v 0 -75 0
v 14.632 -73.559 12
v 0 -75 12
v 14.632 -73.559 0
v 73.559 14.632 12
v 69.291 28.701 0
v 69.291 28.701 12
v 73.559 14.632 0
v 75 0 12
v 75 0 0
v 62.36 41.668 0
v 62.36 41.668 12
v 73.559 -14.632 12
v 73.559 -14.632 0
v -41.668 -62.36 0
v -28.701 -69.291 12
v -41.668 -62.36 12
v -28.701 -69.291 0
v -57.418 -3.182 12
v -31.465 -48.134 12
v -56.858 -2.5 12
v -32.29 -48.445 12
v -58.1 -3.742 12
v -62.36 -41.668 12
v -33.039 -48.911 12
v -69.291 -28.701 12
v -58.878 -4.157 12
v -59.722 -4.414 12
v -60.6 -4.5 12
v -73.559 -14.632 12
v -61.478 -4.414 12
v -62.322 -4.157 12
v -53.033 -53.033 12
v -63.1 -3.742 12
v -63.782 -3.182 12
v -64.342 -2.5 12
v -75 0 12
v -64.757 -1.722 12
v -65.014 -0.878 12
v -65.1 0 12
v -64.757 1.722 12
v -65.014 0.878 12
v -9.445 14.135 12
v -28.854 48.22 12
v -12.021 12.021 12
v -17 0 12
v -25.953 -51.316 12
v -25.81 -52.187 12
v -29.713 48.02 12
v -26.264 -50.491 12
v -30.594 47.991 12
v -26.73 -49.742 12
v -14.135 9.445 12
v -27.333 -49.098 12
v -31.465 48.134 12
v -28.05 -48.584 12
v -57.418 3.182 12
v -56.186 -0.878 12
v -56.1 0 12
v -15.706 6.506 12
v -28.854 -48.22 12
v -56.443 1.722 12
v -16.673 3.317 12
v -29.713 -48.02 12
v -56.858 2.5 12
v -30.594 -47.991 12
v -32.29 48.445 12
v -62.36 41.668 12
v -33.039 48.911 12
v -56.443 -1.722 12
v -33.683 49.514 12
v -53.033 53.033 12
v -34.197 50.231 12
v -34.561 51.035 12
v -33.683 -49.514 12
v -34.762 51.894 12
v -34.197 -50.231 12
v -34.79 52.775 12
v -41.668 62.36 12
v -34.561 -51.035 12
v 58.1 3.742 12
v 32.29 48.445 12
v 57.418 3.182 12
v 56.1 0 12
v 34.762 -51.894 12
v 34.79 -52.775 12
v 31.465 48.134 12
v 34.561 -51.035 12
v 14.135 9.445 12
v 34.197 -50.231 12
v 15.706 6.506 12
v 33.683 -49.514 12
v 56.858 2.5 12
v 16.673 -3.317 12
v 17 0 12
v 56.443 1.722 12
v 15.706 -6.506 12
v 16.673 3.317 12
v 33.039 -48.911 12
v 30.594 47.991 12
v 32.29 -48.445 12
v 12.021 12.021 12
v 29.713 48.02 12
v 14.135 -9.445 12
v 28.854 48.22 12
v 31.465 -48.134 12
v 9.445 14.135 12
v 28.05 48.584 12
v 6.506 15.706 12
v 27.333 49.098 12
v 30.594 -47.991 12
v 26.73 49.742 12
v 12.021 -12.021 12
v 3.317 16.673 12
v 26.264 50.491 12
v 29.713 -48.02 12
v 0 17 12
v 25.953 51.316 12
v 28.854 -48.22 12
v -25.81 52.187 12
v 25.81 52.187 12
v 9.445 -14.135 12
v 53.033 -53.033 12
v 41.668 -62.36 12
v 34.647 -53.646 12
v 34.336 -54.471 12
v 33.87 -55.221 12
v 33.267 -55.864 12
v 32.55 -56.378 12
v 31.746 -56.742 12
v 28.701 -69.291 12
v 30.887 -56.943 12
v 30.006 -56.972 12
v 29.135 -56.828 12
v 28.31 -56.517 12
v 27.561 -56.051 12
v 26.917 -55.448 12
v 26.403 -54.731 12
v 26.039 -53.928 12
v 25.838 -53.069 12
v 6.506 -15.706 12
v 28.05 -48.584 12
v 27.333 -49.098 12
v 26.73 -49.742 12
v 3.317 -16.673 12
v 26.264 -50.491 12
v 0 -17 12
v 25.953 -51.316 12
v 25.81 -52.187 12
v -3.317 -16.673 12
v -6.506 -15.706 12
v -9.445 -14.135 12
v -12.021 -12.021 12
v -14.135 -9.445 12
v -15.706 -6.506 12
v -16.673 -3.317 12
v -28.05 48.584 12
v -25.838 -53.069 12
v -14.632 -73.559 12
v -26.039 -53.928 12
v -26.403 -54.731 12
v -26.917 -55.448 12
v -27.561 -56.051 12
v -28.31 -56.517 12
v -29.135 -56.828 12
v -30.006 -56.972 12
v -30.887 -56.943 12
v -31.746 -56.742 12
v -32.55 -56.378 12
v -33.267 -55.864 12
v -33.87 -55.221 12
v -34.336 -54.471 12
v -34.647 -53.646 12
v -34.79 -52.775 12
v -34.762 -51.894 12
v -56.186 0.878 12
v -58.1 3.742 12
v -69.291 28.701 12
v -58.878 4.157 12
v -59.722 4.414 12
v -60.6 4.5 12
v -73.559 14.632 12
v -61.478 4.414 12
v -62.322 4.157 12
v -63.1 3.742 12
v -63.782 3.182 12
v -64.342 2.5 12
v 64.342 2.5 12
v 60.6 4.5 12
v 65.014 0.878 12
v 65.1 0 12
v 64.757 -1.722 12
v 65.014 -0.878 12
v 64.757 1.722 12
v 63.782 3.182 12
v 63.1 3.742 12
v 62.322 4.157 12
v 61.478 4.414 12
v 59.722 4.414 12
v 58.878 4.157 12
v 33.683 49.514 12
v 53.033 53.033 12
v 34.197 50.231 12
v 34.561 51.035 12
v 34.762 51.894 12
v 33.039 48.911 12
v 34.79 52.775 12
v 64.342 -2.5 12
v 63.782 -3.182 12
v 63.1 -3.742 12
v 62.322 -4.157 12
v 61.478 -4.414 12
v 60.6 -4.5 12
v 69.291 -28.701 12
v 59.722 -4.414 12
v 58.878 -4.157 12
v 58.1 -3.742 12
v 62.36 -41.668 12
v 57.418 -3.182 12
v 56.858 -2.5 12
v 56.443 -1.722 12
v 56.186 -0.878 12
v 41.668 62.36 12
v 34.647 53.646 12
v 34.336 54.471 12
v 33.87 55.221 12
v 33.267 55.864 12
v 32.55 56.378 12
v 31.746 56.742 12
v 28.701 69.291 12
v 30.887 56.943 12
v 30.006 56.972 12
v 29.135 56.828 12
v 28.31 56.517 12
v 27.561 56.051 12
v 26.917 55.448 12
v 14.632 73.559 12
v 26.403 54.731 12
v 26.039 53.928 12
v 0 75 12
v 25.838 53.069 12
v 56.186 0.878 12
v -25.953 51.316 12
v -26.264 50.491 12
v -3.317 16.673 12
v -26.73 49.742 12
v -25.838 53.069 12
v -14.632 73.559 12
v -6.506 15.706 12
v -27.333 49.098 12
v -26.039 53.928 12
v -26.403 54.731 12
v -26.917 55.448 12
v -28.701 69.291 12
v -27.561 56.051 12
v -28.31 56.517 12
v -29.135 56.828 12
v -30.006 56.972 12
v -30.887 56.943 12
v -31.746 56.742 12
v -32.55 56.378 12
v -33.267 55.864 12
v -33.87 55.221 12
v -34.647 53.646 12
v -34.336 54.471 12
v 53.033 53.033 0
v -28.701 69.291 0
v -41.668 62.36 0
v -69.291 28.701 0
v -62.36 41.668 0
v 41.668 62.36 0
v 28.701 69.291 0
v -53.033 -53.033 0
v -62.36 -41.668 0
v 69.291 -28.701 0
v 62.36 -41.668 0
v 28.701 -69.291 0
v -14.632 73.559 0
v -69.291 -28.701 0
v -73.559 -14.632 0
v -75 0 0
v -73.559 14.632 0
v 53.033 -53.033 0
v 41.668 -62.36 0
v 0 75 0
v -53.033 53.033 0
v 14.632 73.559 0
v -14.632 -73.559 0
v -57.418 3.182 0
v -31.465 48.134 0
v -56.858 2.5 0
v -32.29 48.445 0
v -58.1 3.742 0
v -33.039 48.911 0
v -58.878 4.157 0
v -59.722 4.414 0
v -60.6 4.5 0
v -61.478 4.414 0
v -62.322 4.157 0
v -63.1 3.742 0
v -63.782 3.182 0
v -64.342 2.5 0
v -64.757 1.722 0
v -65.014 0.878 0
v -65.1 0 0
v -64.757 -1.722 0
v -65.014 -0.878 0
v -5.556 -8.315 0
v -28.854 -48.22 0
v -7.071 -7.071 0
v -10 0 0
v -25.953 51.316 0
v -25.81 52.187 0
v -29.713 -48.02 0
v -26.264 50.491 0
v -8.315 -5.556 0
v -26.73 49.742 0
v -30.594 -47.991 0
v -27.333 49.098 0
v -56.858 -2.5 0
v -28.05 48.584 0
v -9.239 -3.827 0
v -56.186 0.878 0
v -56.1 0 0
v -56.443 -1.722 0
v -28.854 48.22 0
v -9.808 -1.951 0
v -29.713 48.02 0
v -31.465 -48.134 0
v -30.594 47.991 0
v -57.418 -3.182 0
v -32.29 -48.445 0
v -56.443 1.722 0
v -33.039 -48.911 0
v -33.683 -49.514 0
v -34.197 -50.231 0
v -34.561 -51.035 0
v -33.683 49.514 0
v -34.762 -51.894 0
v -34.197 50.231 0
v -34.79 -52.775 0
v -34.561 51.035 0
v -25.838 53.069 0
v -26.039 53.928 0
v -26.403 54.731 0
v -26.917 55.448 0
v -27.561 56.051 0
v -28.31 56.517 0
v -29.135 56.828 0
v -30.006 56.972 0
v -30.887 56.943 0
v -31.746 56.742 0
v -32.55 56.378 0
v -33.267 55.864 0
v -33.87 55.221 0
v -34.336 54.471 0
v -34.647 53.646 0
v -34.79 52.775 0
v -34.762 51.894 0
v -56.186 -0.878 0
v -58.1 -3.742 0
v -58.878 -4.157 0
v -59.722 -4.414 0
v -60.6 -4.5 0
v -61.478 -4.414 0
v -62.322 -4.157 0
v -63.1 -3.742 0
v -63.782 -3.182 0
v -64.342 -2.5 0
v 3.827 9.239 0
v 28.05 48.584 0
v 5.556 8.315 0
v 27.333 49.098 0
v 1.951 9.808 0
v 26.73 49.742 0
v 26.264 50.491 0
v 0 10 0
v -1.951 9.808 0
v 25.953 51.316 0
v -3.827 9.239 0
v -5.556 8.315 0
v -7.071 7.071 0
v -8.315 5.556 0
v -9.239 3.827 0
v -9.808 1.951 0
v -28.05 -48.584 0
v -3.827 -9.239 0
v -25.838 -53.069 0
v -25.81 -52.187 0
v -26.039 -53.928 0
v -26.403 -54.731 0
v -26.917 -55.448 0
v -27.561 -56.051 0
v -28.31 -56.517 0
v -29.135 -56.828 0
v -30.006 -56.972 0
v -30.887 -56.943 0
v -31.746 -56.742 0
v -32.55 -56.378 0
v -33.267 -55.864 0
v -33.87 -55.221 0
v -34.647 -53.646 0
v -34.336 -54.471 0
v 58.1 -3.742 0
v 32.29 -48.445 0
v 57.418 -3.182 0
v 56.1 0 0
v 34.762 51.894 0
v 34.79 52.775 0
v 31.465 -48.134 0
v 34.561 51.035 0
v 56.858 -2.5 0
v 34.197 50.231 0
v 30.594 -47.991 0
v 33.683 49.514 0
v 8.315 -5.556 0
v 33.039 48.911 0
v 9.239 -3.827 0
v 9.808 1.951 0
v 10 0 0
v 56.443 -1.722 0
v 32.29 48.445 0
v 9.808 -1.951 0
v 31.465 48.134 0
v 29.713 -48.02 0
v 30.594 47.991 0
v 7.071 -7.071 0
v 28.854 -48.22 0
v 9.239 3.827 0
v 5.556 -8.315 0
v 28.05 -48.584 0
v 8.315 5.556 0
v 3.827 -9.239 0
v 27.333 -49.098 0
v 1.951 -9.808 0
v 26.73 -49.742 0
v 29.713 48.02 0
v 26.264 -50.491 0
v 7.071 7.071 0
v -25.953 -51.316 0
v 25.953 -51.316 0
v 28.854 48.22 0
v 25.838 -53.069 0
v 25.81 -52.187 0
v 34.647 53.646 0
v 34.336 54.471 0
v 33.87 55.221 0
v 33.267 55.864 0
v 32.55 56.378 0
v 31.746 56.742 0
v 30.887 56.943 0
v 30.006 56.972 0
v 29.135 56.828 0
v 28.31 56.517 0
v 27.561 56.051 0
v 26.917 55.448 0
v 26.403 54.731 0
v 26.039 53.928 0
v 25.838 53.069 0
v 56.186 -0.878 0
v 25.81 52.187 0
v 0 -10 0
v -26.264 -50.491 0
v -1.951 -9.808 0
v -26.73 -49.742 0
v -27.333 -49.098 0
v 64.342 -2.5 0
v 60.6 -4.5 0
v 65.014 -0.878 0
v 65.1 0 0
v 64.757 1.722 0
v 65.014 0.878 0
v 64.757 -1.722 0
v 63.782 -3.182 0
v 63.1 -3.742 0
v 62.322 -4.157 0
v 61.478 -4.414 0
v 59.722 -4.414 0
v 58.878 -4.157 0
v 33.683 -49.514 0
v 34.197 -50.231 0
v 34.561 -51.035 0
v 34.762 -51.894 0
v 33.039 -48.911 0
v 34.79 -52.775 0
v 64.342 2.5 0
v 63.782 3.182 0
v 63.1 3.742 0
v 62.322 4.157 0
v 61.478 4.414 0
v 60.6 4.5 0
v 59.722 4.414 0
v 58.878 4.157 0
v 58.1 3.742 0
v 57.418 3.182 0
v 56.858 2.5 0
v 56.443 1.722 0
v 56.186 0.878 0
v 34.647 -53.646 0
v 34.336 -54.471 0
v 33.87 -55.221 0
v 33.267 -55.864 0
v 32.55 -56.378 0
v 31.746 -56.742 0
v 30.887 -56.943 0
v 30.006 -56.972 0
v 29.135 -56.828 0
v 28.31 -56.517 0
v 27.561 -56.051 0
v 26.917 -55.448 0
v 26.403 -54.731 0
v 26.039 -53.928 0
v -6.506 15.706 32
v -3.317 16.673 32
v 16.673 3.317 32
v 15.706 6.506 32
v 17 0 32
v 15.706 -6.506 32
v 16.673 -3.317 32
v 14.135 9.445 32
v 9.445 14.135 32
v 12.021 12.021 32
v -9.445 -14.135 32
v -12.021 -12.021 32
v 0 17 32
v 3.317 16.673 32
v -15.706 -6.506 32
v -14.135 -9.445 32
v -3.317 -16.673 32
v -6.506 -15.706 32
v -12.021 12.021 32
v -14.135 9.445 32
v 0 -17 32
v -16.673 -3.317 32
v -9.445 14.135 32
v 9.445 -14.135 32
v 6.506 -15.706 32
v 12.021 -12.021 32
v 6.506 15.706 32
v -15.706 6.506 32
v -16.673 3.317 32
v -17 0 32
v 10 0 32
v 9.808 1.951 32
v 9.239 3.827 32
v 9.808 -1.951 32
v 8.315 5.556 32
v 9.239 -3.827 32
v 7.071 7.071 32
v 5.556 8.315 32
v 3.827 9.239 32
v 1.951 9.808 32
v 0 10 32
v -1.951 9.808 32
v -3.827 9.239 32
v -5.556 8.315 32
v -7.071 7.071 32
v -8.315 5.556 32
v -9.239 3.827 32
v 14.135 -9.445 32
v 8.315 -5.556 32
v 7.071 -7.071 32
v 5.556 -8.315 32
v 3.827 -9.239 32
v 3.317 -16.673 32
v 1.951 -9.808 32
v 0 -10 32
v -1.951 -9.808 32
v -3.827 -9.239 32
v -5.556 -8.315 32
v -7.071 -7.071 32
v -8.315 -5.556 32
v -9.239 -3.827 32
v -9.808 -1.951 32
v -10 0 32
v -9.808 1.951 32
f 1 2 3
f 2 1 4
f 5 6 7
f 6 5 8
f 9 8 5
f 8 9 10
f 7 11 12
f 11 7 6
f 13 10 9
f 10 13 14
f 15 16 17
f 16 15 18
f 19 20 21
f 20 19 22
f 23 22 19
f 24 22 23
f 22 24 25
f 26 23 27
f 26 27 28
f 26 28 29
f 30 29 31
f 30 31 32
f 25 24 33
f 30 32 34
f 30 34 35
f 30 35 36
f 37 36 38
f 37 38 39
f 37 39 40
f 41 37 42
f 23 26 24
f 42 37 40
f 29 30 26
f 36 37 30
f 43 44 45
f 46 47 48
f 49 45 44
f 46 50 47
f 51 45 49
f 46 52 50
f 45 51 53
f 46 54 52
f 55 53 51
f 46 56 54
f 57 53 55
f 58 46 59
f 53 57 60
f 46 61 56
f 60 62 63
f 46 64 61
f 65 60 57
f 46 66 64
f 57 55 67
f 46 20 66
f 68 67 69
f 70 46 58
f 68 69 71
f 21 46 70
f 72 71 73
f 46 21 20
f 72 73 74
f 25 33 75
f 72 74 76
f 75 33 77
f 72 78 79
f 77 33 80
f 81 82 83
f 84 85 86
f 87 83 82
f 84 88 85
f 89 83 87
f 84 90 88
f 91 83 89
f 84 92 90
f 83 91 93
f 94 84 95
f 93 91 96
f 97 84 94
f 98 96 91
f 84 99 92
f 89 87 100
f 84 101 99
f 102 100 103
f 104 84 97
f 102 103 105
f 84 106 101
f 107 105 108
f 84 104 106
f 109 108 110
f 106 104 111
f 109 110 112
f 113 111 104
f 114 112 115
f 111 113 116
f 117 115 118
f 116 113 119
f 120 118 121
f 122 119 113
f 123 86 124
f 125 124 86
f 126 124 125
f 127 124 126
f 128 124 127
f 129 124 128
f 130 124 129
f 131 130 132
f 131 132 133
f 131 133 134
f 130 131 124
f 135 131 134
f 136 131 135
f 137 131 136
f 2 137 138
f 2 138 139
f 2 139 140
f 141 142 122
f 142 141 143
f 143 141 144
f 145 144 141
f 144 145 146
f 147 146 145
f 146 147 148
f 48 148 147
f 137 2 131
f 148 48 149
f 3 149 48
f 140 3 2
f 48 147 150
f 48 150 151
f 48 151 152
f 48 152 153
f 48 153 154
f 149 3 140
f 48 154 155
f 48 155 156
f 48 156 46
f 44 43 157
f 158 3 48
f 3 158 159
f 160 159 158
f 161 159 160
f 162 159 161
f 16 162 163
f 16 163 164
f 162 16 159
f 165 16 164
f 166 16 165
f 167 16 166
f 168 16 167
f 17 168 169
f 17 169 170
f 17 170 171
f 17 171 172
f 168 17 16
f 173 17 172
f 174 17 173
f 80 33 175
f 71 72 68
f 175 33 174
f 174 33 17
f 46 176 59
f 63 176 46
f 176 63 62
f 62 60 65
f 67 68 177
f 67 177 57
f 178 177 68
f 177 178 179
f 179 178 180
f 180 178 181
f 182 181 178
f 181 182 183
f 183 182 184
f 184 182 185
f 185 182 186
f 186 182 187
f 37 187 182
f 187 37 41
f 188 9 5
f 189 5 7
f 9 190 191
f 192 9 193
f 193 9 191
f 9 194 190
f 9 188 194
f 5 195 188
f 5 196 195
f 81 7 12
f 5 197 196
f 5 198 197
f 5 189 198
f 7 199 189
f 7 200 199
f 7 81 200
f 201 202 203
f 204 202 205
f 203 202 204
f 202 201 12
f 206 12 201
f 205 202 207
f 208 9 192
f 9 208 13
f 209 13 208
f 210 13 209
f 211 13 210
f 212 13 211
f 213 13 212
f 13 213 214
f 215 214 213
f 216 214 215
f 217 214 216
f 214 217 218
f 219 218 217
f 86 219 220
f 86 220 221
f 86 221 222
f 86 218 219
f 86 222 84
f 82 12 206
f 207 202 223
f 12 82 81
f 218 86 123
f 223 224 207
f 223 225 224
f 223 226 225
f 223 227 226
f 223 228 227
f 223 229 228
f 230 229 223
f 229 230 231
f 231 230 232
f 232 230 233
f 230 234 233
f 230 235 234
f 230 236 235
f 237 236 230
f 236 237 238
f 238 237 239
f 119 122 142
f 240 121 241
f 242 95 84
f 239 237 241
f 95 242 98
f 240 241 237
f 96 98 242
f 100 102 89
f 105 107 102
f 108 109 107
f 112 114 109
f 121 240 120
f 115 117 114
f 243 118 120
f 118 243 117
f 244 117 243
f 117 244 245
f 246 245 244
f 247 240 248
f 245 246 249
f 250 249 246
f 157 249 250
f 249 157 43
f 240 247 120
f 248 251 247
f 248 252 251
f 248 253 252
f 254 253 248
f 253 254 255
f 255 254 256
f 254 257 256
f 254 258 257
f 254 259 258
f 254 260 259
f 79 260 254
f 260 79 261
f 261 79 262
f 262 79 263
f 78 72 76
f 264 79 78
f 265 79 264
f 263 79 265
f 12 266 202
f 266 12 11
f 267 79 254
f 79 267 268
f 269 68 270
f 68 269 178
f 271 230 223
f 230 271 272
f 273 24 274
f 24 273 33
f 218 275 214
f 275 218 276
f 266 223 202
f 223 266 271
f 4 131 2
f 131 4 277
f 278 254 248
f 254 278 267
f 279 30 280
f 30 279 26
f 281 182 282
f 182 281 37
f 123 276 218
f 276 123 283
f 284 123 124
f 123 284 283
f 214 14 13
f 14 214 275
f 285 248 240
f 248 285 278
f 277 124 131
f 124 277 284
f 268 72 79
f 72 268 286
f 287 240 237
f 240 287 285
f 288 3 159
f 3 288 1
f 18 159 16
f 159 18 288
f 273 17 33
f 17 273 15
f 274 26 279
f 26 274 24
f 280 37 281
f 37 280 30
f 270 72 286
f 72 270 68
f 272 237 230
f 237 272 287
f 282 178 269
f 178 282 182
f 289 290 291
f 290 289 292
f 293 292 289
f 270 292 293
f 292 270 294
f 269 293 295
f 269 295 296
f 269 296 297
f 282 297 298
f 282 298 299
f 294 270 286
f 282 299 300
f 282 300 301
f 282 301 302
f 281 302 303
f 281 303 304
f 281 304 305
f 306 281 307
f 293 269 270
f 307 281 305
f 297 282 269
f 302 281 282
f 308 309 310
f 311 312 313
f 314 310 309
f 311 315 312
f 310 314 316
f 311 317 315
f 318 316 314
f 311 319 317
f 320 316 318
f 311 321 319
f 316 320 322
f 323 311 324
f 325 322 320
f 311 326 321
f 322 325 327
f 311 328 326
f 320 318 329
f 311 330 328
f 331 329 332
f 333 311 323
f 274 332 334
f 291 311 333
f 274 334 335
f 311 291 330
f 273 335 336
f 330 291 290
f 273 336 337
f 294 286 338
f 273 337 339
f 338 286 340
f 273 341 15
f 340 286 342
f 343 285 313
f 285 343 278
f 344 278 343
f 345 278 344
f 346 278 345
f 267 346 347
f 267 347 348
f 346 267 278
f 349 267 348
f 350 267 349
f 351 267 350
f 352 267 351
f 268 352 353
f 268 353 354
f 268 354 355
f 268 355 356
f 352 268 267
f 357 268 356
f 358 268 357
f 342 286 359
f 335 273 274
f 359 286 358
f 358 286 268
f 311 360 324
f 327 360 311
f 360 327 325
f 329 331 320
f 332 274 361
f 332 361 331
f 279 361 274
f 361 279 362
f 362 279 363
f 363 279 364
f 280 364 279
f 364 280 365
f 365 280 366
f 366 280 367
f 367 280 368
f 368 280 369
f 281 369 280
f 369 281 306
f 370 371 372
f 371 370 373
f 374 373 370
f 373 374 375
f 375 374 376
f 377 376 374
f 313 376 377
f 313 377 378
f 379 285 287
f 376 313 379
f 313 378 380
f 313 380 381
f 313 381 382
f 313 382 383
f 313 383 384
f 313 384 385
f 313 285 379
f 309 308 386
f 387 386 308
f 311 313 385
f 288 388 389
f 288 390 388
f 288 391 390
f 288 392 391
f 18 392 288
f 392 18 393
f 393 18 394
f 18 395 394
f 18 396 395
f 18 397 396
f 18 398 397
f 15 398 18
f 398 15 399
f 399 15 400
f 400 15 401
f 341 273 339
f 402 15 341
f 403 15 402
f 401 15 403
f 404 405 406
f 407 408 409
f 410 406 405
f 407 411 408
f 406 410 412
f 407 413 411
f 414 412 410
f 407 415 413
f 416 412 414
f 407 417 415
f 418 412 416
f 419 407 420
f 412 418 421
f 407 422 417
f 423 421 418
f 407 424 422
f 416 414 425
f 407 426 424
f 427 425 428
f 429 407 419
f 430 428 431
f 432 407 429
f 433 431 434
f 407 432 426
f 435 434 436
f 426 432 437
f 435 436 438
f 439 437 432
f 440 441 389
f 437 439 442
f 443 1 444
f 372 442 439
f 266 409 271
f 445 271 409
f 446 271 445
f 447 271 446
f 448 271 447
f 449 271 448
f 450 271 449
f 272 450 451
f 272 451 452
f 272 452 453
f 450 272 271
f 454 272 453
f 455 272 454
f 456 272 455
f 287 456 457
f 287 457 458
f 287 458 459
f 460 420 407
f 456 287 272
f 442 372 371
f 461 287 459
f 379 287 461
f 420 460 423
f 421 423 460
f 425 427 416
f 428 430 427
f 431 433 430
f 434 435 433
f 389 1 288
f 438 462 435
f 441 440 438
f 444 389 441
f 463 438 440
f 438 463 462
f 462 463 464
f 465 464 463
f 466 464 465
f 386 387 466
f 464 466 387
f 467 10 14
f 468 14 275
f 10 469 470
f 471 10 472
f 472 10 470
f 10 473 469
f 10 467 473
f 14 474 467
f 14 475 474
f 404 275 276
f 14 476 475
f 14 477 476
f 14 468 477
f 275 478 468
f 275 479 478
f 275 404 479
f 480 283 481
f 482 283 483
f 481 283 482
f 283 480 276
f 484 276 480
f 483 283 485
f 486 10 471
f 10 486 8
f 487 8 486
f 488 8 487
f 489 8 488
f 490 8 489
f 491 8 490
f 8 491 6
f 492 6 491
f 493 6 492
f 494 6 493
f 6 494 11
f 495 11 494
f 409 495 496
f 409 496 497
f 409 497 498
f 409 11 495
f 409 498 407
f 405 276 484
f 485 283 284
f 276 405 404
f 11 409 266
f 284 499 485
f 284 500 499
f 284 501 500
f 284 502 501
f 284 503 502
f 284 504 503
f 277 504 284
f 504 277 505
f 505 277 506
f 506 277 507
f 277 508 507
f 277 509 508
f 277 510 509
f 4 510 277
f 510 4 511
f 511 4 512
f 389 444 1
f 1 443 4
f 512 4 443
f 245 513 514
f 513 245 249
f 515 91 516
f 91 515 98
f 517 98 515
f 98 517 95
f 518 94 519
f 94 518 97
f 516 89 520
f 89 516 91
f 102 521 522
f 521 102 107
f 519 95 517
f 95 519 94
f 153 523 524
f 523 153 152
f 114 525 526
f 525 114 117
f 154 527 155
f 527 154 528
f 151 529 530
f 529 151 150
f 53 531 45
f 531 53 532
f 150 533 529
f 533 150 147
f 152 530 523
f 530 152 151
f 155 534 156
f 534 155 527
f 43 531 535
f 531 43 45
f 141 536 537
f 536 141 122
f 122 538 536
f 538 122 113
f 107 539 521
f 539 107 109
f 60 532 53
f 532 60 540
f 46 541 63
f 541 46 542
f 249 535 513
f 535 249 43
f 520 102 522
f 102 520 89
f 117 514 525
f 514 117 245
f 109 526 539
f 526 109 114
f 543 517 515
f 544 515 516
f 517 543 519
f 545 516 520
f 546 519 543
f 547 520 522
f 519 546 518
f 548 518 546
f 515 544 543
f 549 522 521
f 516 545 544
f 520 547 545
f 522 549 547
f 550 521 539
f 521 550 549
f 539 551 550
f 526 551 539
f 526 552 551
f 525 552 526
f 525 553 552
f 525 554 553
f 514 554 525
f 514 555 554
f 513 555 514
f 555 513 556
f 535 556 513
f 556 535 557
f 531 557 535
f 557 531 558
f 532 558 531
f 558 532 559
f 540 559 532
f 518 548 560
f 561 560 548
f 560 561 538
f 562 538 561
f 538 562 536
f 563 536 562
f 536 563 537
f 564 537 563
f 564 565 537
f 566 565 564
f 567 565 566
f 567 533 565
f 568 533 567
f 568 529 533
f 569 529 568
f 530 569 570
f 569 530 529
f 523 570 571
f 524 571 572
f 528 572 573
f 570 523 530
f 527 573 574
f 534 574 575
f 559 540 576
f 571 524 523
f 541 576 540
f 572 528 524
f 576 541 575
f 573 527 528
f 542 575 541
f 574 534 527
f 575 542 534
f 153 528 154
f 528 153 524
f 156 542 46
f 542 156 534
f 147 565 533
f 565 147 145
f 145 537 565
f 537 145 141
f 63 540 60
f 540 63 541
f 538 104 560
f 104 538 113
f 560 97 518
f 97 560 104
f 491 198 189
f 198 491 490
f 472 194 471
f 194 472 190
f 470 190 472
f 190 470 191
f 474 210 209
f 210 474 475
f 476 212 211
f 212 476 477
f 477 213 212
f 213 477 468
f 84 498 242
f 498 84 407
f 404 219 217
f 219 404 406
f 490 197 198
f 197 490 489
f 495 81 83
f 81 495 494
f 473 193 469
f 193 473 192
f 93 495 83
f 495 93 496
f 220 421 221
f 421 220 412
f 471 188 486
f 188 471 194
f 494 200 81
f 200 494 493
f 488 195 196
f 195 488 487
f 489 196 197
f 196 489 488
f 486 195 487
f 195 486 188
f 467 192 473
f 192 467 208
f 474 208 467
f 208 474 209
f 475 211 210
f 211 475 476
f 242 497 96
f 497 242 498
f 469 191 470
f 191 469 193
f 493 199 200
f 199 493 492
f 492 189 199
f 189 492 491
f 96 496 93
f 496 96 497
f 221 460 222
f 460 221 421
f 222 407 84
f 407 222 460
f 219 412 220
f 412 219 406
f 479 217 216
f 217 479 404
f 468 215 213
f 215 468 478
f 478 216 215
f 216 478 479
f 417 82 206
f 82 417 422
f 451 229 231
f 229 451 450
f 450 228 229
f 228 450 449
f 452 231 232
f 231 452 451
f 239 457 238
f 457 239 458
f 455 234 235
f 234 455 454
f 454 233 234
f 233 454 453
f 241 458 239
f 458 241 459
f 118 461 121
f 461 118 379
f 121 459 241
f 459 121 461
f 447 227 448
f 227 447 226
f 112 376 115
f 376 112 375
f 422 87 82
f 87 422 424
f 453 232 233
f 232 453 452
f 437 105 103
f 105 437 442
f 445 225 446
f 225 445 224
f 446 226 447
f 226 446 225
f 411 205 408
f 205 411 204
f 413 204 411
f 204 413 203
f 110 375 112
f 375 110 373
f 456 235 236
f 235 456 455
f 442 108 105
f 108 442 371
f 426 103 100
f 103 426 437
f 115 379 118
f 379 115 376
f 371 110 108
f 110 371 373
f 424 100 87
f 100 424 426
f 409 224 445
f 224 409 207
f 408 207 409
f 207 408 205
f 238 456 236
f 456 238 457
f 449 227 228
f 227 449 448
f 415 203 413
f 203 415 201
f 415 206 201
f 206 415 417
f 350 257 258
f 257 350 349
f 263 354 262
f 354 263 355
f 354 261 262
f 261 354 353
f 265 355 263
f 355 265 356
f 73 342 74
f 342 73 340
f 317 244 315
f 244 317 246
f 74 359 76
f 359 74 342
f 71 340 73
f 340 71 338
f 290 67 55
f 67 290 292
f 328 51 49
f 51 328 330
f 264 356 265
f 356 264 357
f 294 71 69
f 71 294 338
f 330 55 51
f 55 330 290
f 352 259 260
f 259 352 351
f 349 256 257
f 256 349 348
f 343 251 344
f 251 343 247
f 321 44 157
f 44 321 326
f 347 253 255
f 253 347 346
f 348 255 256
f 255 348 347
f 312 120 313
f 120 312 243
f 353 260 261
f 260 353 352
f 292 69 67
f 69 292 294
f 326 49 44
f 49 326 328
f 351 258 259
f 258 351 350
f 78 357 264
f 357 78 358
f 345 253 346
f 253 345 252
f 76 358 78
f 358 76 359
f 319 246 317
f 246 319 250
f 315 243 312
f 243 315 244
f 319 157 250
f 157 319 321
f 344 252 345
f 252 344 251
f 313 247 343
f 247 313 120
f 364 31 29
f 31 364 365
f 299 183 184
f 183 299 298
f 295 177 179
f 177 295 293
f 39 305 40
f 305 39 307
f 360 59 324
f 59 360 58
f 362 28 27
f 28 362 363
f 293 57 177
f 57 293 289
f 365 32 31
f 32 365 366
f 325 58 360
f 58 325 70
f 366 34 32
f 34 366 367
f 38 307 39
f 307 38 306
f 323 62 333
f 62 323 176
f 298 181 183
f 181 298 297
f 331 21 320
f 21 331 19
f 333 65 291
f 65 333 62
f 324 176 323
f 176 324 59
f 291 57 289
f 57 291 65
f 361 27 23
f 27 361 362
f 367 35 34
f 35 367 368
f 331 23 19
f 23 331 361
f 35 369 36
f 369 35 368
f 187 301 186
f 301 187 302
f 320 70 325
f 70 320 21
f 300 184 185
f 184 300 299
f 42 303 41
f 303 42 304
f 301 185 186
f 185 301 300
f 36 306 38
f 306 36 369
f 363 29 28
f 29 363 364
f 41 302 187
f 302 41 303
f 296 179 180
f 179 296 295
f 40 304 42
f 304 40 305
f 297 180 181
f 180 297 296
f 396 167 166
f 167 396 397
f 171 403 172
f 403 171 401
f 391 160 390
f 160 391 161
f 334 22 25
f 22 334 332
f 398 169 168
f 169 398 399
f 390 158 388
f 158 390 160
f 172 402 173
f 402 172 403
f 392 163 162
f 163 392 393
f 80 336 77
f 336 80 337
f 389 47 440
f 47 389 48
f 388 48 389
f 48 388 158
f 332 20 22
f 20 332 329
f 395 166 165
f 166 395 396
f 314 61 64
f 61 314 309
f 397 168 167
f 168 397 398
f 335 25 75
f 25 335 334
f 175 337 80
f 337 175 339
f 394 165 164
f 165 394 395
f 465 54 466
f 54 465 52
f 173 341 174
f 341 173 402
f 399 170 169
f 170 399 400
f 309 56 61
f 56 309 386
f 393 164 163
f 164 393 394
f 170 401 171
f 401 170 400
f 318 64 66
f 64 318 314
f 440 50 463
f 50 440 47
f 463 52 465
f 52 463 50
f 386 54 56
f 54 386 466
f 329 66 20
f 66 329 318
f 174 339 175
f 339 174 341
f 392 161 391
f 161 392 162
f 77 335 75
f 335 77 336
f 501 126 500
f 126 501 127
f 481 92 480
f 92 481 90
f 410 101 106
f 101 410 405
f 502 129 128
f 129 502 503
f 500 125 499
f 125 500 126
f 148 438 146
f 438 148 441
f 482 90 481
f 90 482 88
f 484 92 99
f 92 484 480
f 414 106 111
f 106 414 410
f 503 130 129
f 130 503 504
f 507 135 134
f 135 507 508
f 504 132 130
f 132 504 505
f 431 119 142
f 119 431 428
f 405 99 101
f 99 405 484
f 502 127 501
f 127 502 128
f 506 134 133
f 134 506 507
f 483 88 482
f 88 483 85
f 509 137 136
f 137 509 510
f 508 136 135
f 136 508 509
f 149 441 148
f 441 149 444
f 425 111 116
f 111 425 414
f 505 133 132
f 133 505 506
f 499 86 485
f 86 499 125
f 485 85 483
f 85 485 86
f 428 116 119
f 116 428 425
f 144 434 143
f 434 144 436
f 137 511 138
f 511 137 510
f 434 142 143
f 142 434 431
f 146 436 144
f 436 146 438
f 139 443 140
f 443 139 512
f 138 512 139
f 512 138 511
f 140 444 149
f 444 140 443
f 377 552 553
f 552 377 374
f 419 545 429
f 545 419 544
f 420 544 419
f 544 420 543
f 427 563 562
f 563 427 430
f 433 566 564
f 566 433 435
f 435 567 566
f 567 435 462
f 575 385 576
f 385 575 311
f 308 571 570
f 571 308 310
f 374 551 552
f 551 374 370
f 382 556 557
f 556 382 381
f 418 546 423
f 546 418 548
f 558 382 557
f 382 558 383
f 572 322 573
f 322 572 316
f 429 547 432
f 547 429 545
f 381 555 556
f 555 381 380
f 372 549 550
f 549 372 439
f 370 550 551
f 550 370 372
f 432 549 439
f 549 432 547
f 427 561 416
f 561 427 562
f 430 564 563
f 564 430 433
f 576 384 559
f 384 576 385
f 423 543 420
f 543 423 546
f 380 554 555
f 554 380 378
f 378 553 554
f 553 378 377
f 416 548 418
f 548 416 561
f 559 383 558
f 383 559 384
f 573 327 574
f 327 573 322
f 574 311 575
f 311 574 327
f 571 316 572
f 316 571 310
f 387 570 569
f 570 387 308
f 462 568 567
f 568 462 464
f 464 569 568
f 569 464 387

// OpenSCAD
$fn = 32;

// ----------------------------------------------------------------------
// Bolt-circle flange: 150 mm outside, 6 bolt holes, bore 20 mm
// ----------------------------------------------------------------------

// --- parameters (mm) ---
flange_d = 150;           // flange outside diameter
flange_t = 12;            // flange thickness
bolts = 6;                // number of bolt holes
bolt_d = 9;               // bolt clearance
bolt_r = 60.6;            // bolt circle radius
bore_d = 20;              // centre bore
hub_d = 34;               // raised hub diameter
hub_h = 20;               // raised hub height

module body() {
  cylinder(h = flange_t, d = flange_d);
  /* raised hub, sunk 1 mm into the flange */
  translate([0, 0, flange_t - 1]) cylinder(h = hub_h + 1, d = hub_d);
}

difference() {
  body();
  /* bolt circle */
  for (i = [0 : bolts - 1]) rotate([0, 0, i * 360 / bolts]) translate([bolt_r, 0, -1]) cylinder(h = flange_t + hub_h + 3, d = bolt_d);
  translate([0, 0, -1]) cylinder(h = flange_t + hub_h + 3, d = bore_d);
}
